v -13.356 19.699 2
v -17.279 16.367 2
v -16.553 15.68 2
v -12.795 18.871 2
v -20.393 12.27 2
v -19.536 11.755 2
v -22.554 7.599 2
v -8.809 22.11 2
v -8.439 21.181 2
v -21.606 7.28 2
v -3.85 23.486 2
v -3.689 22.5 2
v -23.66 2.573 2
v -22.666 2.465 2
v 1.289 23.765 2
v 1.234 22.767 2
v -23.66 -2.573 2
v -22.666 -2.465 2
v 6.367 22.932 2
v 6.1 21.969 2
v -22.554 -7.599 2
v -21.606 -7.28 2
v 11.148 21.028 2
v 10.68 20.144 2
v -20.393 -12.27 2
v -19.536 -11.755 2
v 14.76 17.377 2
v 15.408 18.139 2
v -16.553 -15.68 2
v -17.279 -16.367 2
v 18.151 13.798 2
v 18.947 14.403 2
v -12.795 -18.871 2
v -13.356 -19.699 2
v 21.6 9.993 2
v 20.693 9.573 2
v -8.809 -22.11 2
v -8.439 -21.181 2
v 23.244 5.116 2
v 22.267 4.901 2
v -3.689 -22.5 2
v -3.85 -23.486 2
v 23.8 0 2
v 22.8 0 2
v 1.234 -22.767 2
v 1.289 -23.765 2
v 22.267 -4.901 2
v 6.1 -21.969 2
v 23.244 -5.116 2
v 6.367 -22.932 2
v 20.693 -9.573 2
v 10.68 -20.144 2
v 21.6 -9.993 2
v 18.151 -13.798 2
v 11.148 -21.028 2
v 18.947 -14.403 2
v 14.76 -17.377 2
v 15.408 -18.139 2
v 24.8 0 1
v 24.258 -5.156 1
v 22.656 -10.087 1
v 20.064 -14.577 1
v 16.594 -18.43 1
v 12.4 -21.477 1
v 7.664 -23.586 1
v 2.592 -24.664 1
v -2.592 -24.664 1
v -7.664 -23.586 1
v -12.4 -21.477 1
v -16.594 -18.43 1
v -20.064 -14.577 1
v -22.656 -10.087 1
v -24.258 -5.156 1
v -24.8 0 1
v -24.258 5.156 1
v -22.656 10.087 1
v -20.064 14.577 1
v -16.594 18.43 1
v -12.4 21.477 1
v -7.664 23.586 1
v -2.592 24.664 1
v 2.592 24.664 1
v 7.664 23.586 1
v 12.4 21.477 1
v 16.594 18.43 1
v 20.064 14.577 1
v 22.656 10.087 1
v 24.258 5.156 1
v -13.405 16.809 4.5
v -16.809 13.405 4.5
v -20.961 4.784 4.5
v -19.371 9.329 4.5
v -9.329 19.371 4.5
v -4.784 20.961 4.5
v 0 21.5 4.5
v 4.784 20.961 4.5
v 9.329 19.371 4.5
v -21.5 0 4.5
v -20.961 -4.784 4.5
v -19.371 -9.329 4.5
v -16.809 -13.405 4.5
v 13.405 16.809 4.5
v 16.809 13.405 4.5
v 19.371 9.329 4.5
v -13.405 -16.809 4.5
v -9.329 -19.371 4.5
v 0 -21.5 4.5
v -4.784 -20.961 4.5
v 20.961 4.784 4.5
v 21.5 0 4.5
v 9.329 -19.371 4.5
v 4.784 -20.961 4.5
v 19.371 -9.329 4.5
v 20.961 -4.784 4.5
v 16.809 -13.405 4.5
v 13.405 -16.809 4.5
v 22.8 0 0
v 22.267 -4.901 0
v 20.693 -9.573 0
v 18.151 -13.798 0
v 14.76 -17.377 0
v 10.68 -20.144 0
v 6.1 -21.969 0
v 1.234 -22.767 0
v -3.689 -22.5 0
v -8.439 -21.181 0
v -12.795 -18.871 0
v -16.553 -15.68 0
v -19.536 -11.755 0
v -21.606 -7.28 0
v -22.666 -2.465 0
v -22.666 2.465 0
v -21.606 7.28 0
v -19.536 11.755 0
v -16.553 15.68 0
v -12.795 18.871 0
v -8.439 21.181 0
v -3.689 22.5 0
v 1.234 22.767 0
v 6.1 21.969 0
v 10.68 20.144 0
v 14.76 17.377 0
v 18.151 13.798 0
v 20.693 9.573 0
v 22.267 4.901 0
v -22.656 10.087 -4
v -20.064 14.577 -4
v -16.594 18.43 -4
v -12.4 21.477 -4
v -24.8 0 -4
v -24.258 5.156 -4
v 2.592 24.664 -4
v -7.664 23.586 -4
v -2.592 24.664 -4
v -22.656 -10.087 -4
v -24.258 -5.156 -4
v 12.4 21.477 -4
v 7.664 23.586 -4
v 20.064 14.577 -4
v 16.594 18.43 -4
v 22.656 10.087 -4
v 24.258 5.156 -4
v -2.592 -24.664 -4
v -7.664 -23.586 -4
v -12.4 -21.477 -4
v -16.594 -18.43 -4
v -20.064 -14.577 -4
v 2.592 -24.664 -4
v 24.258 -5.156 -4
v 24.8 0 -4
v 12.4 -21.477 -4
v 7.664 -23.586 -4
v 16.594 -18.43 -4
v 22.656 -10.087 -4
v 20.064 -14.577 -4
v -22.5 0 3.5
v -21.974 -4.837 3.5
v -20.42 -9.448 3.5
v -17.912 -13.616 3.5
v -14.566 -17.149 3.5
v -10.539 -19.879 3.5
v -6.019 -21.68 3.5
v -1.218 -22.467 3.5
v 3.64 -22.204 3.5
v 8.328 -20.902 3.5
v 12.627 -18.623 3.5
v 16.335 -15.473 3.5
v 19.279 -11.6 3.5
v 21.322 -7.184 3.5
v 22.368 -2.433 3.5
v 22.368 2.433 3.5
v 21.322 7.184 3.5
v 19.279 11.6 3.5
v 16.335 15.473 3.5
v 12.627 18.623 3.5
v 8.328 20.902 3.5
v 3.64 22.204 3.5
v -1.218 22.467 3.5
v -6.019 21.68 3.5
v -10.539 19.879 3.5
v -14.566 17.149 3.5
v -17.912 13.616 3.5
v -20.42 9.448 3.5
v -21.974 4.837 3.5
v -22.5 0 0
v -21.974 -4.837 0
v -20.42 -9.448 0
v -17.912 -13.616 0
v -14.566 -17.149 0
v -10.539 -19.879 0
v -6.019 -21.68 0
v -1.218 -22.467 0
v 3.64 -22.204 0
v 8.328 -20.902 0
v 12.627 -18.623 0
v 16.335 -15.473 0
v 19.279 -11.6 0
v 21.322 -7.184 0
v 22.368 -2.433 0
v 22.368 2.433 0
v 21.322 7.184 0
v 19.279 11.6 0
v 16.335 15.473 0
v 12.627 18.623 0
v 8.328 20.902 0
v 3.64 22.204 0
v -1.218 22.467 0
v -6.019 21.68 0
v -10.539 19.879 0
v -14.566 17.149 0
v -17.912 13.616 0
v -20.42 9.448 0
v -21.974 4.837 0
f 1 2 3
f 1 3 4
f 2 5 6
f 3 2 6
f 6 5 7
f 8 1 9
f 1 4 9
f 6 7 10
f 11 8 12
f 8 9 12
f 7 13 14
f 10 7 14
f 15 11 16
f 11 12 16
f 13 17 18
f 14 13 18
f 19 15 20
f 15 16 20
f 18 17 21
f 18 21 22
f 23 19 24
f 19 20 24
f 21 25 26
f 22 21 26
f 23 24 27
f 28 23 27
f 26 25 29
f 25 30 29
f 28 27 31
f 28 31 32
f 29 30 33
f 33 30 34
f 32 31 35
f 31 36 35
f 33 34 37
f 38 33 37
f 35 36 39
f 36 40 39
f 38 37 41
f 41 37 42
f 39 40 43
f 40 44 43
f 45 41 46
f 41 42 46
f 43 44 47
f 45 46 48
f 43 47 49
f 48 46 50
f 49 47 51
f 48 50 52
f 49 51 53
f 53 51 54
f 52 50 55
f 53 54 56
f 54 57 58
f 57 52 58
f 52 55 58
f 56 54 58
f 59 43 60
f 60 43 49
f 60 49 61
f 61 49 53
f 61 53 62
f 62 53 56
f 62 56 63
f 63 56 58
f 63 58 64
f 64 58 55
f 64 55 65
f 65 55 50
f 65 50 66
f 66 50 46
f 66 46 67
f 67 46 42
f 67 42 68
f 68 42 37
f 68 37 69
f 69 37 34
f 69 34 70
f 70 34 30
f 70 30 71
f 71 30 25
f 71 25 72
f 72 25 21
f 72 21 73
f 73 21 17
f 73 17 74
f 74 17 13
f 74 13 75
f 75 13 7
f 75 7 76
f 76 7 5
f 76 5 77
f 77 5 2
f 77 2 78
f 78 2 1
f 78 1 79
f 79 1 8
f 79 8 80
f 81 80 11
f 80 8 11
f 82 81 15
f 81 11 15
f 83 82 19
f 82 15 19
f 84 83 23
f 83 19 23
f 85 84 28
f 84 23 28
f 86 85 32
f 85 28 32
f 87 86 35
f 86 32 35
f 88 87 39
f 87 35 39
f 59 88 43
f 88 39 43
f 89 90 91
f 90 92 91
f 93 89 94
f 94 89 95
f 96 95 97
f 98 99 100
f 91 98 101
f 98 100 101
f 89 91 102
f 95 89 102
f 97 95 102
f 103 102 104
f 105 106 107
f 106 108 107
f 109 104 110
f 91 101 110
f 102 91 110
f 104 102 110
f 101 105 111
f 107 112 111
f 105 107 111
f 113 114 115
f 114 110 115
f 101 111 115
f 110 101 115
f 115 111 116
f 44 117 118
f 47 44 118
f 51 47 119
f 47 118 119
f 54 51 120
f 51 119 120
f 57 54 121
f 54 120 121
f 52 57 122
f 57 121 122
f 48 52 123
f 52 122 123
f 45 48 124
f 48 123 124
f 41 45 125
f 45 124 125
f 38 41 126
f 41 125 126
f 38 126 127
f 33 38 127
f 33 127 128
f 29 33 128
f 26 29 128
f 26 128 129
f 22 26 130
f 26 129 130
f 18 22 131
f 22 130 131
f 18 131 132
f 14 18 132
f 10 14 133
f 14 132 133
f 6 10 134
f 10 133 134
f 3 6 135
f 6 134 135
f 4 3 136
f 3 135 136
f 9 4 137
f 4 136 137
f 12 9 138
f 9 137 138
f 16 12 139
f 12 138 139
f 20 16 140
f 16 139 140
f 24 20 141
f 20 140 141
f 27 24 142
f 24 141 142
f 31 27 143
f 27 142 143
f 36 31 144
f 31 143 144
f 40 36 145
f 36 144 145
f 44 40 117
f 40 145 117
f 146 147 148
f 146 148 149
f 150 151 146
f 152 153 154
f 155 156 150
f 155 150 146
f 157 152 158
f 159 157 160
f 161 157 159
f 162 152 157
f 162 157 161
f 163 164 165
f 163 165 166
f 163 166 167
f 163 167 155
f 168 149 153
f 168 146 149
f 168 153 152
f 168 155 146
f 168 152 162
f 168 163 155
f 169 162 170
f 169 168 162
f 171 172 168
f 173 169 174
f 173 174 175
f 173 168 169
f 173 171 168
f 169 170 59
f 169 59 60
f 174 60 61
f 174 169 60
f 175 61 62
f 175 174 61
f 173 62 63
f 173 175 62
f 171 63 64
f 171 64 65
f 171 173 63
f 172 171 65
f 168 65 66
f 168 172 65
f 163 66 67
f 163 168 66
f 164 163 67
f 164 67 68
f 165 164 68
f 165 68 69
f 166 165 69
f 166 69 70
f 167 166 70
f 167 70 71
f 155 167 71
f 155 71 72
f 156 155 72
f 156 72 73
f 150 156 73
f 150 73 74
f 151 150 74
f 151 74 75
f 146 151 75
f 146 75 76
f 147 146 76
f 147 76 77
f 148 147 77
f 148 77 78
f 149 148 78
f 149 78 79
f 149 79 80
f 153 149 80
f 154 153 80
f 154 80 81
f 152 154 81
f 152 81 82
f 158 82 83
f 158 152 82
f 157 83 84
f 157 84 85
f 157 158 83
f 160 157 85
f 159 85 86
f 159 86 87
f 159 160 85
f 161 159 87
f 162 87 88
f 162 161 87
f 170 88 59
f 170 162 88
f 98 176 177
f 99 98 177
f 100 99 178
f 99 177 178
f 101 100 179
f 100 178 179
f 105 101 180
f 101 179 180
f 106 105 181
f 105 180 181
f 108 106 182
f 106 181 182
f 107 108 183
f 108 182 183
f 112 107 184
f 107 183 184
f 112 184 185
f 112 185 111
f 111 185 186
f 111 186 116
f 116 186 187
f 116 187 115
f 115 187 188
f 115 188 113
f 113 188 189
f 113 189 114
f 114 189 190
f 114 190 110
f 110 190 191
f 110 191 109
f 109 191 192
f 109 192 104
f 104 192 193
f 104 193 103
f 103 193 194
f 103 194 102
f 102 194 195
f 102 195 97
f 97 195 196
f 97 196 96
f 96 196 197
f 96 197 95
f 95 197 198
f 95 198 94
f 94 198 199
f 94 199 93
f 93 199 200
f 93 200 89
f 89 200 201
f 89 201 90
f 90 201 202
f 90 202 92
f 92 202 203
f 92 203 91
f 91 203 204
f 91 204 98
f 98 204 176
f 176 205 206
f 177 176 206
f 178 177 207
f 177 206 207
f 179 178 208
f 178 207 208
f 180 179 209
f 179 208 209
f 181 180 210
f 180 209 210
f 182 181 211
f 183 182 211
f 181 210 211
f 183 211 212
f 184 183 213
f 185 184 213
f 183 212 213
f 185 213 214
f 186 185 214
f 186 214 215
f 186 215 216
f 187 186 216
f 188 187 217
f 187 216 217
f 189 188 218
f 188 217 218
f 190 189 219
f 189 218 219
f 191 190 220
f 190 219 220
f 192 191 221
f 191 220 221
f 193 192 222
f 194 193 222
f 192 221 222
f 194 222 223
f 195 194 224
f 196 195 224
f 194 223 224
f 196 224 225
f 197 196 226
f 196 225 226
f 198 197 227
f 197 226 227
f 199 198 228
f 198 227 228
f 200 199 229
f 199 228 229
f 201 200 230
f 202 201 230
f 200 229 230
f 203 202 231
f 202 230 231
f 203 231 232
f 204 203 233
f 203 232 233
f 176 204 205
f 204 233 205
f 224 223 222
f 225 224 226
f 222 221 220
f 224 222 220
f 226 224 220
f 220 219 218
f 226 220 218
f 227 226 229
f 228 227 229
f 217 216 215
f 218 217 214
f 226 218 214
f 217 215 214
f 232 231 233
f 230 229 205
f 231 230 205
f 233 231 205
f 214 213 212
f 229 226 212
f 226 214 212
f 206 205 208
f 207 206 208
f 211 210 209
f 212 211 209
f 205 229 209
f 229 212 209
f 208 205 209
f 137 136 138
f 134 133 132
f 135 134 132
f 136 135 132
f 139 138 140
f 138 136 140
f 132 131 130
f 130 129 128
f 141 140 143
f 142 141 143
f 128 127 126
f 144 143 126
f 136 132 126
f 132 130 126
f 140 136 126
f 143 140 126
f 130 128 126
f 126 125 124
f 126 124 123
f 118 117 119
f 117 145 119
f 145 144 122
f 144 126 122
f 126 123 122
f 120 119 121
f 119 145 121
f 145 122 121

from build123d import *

# Parameters (mm, degrees)
F0_W     = 20
F0_H     = 2
F2_SIZE  = 1
F3_R     = 24.8
F3_R_2   = 22.8
F3_R_3   = 22.5
F4_DEPTH = 4
F5_DEPTH = 2
F6_SIZE  = 1


with BuildPart() as f1:
    # F0 (on Front) → F1 (revolve)
    with BuildSketch(Plane.XZ):
        Polygon((-22.5, 0), (0, 0), (0, 2.5), (-20, 2.5), (-20, 4.5), (-22.5, 4.5), (-22.5, 2.5), align=None)
        with Locations((-10, 3.5)):
            Rectangle(F0_W, F0_H)
    revolve(axis=Axis((0, 0, 1.25), (0, 0, 1)))

    # F2
    f2_edges = [f1.edges().sort_by_distance(p)[0] for p in [
        (22.5, 0, 4.5),
    ]]
    chamfer(f2_edges, length=F2_SIZE)


with BuildPart() as f4:
    # F3 (on face) → F4 (new body)
    with BuildSketch(Plane(origin=(0, 0, 0), x_dir=(1, 0, 0), z_dir=(0, 0, -1))):
        Circle(F3_R)
        Circle(F3_R_2, mode=Mode.SUBTRACT)
        Circle(F3_R_2)
        Circle(F3_R_3, mode=Mode.SUBTRACT)
        Circle(F3_R_3)
    extrude(amount=F4_DEPTH)

    # F3 (on face) → F5 (join)
    with BuildSketch(Plane(origin=(0, 0, 0), x_dir=(1, 0, 0), z_dir=(0, 0, -1))):
        Circle(F3_R)
        Circle(F3_R_2, mode=Mode.SUBTRACT)
    extrude(amount=-F5_DEPTH)

    # F6
    f6_edges = [f4.edges().sort_by_distance(p)[0] for p in [
        (-24.8, 0, 2),
    ]]
    chamfer(f6_edges, length=F6_SIZE)


solid = Compound([f1.part, f4.part])
